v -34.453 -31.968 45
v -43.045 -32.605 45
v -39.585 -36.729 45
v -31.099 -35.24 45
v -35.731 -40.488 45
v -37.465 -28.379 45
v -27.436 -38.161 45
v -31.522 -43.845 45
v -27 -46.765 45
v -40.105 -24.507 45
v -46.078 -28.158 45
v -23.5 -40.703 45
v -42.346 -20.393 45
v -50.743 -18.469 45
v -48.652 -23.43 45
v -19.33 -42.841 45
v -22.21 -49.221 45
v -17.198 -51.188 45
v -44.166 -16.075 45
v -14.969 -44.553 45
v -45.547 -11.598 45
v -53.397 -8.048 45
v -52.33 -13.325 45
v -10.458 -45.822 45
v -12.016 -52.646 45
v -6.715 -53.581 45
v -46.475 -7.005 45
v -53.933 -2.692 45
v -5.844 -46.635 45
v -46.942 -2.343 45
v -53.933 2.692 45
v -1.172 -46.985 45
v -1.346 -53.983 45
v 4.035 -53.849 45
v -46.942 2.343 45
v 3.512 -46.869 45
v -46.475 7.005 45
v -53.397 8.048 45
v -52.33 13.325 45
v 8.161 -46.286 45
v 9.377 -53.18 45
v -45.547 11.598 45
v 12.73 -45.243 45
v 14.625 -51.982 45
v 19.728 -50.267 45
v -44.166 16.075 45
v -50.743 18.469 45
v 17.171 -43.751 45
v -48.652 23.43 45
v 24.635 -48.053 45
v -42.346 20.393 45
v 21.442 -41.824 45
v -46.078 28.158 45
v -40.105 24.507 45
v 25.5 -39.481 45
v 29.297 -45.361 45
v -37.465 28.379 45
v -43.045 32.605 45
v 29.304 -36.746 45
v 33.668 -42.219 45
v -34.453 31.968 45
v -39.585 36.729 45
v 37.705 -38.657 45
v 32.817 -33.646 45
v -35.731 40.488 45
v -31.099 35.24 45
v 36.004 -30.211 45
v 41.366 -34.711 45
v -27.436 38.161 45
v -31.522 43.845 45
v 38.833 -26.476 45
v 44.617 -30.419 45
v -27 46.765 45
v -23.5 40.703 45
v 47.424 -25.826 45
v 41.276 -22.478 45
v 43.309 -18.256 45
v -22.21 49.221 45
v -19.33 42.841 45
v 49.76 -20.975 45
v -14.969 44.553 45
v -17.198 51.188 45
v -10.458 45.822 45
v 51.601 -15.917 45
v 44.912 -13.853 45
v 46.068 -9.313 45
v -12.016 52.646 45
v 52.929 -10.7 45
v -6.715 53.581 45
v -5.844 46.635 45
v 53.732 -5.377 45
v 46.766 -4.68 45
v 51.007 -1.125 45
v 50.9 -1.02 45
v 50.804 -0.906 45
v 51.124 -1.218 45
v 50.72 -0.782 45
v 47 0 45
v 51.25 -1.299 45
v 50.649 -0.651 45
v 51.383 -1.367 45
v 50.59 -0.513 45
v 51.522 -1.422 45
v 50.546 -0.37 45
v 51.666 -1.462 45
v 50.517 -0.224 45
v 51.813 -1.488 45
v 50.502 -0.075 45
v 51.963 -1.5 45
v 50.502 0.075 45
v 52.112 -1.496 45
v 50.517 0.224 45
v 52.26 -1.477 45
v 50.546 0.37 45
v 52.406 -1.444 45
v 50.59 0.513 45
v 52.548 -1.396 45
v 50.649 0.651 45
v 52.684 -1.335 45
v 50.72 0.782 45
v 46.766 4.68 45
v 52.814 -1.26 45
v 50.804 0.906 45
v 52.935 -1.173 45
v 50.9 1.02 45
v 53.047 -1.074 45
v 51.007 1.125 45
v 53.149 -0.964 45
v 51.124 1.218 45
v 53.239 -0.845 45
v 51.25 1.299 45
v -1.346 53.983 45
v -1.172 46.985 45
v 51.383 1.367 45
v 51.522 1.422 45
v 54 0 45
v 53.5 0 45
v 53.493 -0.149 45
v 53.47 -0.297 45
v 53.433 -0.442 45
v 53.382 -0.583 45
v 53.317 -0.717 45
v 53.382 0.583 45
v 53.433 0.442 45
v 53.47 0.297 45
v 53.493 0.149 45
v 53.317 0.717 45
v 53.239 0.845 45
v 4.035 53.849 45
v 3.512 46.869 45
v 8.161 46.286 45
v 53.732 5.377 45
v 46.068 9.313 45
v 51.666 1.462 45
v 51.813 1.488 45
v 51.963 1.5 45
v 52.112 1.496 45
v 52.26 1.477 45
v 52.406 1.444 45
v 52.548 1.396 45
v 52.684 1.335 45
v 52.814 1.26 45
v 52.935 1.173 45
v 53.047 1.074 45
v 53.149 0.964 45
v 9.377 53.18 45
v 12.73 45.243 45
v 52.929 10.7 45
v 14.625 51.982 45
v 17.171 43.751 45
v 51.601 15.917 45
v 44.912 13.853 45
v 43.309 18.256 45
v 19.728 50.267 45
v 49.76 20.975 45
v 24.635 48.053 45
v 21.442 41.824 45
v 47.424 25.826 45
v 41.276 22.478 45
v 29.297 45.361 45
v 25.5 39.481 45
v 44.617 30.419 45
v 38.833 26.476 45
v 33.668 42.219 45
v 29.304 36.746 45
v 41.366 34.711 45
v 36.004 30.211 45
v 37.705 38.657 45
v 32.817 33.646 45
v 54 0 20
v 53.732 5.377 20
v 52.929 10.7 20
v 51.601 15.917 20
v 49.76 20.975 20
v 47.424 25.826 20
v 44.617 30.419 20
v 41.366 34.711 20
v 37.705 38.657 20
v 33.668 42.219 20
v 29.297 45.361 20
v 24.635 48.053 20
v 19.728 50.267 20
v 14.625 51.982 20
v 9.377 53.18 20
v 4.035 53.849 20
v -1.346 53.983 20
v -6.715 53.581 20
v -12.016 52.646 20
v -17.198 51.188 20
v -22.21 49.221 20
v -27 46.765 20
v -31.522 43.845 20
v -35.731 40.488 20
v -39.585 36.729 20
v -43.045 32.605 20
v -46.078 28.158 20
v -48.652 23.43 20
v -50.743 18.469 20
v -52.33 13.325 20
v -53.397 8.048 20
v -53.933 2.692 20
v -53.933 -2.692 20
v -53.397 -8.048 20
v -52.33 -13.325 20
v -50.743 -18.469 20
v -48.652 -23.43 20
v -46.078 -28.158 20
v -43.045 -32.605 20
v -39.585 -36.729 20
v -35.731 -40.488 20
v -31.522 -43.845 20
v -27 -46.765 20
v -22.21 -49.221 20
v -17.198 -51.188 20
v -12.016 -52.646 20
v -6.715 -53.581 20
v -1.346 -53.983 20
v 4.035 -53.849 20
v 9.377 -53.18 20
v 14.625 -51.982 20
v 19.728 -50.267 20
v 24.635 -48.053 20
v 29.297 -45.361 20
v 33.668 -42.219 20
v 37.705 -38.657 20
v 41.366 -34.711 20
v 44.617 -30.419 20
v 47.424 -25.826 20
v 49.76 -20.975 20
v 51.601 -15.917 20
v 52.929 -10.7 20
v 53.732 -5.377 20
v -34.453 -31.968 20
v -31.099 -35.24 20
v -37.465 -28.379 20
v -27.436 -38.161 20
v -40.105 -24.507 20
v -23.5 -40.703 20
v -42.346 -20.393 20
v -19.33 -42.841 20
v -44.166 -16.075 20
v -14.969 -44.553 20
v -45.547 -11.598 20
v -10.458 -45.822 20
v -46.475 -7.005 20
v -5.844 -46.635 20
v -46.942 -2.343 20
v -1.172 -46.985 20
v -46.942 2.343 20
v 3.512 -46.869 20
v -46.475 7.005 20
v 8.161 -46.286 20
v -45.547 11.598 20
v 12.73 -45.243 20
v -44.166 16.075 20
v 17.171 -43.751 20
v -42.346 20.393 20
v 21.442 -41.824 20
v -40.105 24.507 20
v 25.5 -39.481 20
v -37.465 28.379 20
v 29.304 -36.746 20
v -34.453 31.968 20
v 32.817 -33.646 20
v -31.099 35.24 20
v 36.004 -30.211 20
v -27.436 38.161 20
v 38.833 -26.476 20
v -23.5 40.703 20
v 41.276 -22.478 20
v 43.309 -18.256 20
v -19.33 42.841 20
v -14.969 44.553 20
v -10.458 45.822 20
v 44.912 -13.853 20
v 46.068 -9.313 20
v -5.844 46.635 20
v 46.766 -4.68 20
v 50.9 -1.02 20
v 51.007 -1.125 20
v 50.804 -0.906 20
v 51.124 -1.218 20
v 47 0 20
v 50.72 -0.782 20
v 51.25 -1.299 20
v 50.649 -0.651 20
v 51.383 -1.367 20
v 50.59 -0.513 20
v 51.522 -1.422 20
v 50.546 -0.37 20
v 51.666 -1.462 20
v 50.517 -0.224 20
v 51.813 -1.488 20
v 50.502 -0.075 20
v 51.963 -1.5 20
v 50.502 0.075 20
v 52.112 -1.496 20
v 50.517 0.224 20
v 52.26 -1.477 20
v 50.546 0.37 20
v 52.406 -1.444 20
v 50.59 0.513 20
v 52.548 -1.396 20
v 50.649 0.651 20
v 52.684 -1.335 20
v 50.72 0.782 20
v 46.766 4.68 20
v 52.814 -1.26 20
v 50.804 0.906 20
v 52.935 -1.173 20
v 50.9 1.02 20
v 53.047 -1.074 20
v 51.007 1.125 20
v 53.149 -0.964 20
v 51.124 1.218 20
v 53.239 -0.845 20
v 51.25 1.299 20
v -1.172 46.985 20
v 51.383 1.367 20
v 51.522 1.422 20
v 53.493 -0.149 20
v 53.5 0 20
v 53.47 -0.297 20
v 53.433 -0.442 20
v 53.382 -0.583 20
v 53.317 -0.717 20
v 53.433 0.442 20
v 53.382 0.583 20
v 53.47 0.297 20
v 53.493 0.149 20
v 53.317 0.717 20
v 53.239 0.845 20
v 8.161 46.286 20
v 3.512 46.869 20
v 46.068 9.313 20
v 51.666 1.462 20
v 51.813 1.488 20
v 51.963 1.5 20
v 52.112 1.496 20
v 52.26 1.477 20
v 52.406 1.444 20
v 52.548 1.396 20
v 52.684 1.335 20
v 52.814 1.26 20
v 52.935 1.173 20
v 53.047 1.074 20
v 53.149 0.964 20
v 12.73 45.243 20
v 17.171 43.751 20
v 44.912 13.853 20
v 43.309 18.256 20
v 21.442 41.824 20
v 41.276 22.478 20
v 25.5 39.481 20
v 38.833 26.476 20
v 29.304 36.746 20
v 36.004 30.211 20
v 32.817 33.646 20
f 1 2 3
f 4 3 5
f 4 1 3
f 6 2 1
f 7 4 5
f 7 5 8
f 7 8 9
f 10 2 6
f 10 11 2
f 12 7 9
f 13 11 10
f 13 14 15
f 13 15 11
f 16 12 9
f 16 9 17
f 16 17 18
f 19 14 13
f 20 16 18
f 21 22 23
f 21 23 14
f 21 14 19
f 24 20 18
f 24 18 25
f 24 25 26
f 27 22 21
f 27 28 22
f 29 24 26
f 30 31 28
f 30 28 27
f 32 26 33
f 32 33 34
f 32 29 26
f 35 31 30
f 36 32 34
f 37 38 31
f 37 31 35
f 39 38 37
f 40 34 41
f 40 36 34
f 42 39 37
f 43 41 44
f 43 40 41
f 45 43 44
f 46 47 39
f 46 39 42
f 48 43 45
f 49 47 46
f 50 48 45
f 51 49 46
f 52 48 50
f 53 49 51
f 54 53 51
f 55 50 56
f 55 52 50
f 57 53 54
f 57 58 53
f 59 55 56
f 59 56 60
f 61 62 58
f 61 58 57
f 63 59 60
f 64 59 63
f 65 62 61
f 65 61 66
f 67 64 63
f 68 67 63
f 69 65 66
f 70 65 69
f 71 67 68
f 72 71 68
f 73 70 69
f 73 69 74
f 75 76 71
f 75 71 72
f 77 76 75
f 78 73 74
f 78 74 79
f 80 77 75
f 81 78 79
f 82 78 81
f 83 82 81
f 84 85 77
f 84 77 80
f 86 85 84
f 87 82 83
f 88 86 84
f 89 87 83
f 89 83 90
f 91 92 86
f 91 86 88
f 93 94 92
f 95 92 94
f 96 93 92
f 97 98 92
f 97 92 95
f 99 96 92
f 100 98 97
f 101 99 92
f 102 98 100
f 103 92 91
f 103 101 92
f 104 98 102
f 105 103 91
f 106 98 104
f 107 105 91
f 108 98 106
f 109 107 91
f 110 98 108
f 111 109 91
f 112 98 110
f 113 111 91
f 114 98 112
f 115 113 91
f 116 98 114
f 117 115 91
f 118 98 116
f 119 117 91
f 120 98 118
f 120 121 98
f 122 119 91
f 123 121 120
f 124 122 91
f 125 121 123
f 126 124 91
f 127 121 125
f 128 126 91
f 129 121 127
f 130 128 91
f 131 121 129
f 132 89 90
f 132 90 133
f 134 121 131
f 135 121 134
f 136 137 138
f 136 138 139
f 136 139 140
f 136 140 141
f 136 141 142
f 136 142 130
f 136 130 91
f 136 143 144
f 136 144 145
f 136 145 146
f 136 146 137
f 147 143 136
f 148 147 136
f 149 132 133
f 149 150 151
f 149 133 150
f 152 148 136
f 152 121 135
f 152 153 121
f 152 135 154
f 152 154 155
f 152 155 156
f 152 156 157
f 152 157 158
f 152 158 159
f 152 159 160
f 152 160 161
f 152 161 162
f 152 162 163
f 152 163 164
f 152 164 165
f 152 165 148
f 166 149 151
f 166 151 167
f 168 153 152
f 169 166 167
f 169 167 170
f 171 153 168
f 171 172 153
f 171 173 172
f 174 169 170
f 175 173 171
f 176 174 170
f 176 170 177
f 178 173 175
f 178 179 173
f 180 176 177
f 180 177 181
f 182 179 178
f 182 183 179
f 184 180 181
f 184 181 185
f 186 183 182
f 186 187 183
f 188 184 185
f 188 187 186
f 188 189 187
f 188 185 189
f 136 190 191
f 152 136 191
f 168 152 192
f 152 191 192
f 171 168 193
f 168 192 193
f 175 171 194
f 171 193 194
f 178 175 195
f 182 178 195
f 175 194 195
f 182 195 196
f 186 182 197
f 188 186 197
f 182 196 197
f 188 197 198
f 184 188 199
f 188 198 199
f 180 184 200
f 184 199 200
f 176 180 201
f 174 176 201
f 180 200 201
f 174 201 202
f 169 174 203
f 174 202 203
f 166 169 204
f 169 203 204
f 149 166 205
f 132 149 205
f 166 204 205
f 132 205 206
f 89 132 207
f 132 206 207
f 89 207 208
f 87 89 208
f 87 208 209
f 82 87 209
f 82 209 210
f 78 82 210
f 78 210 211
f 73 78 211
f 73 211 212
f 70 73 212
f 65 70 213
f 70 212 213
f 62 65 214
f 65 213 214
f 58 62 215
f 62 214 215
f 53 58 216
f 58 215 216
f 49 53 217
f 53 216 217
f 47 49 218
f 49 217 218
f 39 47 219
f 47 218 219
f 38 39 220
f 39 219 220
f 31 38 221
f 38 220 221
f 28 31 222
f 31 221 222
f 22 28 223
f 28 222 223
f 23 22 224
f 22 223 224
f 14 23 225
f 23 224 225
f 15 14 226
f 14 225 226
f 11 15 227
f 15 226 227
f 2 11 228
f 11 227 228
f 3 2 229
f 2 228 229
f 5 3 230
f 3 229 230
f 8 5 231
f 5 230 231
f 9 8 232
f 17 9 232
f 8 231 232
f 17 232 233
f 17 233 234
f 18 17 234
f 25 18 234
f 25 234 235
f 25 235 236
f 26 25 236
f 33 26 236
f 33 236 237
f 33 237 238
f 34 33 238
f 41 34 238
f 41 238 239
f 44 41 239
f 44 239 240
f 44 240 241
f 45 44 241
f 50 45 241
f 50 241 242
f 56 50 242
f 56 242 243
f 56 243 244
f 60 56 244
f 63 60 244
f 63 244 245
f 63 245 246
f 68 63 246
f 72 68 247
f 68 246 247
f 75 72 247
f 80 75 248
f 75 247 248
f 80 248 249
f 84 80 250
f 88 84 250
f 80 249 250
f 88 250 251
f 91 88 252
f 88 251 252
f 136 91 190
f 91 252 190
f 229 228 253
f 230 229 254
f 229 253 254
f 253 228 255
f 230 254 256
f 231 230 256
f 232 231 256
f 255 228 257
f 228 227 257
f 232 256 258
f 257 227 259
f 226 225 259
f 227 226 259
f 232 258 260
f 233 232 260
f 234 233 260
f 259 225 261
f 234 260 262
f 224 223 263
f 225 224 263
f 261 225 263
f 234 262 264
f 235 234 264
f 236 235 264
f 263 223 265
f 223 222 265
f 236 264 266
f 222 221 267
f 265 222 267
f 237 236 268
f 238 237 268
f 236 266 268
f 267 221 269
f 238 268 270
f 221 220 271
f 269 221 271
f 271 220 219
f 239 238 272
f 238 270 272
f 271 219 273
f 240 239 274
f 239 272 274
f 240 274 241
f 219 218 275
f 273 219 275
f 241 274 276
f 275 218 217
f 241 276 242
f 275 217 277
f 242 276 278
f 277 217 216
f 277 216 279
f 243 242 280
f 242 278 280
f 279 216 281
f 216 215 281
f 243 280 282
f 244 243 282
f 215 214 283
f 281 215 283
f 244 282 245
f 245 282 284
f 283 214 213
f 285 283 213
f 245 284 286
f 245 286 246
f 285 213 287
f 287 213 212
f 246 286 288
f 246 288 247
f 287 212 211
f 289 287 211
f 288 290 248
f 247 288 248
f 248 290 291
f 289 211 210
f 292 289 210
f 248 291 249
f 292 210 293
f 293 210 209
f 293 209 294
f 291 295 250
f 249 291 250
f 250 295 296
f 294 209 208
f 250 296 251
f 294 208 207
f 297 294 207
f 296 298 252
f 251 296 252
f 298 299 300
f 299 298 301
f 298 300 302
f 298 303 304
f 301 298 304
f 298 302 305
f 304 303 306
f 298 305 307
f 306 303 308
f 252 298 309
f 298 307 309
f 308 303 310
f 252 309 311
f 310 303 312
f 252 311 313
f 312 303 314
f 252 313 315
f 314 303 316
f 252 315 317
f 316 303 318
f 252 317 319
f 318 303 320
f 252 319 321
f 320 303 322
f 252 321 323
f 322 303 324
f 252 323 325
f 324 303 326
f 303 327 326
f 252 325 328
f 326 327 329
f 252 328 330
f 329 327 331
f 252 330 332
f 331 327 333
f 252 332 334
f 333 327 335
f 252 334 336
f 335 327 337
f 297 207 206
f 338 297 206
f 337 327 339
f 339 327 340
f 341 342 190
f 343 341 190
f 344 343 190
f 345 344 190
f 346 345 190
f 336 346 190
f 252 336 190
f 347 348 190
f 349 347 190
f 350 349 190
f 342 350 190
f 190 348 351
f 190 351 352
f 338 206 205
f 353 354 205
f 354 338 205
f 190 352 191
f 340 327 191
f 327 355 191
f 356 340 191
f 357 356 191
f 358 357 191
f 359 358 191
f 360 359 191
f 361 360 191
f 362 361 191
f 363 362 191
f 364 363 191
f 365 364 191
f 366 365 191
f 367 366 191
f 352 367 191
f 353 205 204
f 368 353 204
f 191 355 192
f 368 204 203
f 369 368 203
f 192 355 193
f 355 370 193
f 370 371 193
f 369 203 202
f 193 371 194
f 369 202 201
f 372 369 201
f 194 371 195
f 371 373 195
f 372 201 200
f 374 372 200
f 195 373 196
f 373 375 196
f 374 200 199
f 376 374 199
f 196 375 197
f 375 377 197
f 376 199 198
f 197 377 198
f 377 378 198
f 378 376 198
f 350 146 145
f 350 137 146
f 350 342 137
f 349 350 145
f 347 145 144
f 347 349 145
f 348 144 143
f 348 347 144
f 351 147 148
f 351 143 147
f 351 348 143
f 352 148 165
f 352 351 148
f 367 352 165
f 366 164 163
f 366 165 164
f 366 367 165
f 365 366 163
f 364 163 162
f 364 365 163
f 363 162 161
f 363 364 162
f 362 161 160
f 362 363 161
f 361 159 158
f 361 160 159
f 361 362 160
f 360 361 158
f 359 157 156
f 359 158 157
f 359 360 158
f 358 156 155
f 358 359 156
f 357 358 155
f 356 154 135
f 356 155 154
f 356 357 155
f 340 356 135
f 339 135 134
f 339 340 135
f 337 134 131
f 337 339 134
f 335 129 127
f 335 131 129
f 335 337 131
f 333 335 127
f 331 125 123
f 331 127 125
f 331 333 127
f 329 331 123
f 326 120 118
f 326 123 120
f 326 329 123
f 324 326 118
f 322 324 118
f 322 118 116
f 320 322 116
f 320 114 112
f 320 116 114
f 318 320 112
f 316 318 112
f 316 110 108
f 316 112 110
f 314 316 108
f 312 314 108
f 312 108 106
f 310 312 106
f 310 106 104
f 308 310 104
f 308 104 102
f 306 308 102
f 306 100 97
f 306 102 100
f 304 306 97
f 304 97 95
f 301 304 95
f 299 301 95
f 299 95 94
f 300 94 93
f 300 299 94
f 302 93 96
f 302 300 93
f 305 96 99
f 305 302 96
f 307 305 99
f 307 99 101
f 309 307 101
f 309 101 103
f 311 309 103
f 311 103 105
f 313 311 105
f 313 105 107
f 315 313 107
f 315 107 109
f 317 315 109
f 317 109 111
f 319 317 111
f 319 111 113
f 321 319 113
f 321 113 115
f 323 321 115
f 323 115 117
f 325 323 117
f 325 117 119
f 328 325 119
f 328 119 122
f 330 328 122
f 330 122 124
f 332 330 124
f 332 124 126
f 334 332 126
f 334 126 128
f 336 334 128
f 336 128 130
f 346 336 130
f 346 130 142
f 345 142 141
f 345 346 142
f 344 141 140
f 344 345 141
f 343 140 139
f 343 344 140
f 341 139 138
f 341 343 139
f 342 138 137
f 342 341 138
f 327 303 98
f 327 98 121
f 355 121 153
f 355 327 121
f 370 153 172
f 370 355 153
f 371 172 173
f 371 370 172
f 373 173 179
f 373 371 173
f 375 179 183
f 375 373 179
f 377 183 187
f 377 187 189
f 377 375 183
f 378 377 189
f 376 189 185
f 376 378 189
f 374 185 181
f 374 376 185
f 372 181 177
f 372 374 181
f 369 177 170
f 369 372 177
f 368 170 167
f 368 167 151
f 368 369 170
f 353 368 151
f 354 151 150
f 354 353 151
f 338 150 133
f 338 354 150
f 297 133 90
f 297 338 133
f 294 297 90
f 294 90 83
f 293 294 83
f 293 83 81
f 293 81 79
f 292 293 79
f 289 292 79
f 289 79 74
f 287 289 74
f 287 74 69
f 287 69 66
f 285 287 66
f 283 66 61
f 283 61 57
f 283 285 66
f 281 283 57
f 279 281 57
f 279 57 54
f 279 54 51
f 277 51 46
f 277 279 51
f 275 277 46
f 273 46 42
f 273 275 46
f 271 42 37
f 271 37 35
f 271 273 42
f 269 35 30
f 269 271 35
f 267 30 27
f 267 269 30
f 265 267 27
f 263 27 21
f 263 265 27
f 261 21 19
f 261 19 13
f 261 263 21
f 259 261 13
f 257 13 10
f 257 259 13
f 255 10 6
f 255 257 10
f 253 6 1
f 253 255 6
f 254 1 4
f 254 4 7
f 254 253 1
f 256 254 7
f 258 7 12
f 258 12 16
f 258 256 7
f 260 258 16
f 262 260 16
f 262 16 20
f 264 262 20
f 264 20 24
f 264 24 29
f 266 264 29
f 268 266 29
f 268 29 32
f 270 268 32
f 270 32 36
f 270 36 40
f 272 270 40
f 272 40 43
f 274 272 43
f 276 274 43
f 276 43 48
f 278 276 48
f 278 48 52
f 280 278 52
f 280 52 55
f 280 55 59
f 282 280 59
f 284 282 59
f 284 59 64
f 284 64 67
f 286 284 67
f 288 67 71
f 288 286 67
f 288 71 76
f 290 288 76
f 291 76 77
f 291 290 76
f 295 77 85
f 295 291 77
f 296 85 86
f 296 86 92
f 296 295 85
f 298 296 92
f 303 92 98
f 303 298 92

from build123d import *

# Parameters (mm, degrees)
CYLINDER1142_R     = 1.5
CYLINDER1142_DEPTH = 50
TUBE102_R          = 54
TUBE102_R_2        = 47
TUBE102_DEPTH      = 25


with BuildPart() as v_lec1142:
    # Cylinder1142 → Cylinder1142 (new body)
    with BuildSketch(Plane(origin=(52, 0, 0), x_dir=(1, 0, 0), z_dir=(0, 0, 1))):
        Circle(CYLINDER1142_R)
    extrude(amount=CYLINDER1142_DEPTH)


with BuildPart() as thino:
    # Tube102 → Tube102 (new body)
    with BuildSketch(Plane.XY.offset(20)):
        Circle(TUBE102_R)
        Circle(TUBE102_R_2, mode=Mode.SUBTRACT)
    extrude(amount=TUBE102_DEPTH)

    # Cut: cut Válec1142
    add(v_lec1142.part, mode=Mode.SUBTRACT)


solid = thino.part
